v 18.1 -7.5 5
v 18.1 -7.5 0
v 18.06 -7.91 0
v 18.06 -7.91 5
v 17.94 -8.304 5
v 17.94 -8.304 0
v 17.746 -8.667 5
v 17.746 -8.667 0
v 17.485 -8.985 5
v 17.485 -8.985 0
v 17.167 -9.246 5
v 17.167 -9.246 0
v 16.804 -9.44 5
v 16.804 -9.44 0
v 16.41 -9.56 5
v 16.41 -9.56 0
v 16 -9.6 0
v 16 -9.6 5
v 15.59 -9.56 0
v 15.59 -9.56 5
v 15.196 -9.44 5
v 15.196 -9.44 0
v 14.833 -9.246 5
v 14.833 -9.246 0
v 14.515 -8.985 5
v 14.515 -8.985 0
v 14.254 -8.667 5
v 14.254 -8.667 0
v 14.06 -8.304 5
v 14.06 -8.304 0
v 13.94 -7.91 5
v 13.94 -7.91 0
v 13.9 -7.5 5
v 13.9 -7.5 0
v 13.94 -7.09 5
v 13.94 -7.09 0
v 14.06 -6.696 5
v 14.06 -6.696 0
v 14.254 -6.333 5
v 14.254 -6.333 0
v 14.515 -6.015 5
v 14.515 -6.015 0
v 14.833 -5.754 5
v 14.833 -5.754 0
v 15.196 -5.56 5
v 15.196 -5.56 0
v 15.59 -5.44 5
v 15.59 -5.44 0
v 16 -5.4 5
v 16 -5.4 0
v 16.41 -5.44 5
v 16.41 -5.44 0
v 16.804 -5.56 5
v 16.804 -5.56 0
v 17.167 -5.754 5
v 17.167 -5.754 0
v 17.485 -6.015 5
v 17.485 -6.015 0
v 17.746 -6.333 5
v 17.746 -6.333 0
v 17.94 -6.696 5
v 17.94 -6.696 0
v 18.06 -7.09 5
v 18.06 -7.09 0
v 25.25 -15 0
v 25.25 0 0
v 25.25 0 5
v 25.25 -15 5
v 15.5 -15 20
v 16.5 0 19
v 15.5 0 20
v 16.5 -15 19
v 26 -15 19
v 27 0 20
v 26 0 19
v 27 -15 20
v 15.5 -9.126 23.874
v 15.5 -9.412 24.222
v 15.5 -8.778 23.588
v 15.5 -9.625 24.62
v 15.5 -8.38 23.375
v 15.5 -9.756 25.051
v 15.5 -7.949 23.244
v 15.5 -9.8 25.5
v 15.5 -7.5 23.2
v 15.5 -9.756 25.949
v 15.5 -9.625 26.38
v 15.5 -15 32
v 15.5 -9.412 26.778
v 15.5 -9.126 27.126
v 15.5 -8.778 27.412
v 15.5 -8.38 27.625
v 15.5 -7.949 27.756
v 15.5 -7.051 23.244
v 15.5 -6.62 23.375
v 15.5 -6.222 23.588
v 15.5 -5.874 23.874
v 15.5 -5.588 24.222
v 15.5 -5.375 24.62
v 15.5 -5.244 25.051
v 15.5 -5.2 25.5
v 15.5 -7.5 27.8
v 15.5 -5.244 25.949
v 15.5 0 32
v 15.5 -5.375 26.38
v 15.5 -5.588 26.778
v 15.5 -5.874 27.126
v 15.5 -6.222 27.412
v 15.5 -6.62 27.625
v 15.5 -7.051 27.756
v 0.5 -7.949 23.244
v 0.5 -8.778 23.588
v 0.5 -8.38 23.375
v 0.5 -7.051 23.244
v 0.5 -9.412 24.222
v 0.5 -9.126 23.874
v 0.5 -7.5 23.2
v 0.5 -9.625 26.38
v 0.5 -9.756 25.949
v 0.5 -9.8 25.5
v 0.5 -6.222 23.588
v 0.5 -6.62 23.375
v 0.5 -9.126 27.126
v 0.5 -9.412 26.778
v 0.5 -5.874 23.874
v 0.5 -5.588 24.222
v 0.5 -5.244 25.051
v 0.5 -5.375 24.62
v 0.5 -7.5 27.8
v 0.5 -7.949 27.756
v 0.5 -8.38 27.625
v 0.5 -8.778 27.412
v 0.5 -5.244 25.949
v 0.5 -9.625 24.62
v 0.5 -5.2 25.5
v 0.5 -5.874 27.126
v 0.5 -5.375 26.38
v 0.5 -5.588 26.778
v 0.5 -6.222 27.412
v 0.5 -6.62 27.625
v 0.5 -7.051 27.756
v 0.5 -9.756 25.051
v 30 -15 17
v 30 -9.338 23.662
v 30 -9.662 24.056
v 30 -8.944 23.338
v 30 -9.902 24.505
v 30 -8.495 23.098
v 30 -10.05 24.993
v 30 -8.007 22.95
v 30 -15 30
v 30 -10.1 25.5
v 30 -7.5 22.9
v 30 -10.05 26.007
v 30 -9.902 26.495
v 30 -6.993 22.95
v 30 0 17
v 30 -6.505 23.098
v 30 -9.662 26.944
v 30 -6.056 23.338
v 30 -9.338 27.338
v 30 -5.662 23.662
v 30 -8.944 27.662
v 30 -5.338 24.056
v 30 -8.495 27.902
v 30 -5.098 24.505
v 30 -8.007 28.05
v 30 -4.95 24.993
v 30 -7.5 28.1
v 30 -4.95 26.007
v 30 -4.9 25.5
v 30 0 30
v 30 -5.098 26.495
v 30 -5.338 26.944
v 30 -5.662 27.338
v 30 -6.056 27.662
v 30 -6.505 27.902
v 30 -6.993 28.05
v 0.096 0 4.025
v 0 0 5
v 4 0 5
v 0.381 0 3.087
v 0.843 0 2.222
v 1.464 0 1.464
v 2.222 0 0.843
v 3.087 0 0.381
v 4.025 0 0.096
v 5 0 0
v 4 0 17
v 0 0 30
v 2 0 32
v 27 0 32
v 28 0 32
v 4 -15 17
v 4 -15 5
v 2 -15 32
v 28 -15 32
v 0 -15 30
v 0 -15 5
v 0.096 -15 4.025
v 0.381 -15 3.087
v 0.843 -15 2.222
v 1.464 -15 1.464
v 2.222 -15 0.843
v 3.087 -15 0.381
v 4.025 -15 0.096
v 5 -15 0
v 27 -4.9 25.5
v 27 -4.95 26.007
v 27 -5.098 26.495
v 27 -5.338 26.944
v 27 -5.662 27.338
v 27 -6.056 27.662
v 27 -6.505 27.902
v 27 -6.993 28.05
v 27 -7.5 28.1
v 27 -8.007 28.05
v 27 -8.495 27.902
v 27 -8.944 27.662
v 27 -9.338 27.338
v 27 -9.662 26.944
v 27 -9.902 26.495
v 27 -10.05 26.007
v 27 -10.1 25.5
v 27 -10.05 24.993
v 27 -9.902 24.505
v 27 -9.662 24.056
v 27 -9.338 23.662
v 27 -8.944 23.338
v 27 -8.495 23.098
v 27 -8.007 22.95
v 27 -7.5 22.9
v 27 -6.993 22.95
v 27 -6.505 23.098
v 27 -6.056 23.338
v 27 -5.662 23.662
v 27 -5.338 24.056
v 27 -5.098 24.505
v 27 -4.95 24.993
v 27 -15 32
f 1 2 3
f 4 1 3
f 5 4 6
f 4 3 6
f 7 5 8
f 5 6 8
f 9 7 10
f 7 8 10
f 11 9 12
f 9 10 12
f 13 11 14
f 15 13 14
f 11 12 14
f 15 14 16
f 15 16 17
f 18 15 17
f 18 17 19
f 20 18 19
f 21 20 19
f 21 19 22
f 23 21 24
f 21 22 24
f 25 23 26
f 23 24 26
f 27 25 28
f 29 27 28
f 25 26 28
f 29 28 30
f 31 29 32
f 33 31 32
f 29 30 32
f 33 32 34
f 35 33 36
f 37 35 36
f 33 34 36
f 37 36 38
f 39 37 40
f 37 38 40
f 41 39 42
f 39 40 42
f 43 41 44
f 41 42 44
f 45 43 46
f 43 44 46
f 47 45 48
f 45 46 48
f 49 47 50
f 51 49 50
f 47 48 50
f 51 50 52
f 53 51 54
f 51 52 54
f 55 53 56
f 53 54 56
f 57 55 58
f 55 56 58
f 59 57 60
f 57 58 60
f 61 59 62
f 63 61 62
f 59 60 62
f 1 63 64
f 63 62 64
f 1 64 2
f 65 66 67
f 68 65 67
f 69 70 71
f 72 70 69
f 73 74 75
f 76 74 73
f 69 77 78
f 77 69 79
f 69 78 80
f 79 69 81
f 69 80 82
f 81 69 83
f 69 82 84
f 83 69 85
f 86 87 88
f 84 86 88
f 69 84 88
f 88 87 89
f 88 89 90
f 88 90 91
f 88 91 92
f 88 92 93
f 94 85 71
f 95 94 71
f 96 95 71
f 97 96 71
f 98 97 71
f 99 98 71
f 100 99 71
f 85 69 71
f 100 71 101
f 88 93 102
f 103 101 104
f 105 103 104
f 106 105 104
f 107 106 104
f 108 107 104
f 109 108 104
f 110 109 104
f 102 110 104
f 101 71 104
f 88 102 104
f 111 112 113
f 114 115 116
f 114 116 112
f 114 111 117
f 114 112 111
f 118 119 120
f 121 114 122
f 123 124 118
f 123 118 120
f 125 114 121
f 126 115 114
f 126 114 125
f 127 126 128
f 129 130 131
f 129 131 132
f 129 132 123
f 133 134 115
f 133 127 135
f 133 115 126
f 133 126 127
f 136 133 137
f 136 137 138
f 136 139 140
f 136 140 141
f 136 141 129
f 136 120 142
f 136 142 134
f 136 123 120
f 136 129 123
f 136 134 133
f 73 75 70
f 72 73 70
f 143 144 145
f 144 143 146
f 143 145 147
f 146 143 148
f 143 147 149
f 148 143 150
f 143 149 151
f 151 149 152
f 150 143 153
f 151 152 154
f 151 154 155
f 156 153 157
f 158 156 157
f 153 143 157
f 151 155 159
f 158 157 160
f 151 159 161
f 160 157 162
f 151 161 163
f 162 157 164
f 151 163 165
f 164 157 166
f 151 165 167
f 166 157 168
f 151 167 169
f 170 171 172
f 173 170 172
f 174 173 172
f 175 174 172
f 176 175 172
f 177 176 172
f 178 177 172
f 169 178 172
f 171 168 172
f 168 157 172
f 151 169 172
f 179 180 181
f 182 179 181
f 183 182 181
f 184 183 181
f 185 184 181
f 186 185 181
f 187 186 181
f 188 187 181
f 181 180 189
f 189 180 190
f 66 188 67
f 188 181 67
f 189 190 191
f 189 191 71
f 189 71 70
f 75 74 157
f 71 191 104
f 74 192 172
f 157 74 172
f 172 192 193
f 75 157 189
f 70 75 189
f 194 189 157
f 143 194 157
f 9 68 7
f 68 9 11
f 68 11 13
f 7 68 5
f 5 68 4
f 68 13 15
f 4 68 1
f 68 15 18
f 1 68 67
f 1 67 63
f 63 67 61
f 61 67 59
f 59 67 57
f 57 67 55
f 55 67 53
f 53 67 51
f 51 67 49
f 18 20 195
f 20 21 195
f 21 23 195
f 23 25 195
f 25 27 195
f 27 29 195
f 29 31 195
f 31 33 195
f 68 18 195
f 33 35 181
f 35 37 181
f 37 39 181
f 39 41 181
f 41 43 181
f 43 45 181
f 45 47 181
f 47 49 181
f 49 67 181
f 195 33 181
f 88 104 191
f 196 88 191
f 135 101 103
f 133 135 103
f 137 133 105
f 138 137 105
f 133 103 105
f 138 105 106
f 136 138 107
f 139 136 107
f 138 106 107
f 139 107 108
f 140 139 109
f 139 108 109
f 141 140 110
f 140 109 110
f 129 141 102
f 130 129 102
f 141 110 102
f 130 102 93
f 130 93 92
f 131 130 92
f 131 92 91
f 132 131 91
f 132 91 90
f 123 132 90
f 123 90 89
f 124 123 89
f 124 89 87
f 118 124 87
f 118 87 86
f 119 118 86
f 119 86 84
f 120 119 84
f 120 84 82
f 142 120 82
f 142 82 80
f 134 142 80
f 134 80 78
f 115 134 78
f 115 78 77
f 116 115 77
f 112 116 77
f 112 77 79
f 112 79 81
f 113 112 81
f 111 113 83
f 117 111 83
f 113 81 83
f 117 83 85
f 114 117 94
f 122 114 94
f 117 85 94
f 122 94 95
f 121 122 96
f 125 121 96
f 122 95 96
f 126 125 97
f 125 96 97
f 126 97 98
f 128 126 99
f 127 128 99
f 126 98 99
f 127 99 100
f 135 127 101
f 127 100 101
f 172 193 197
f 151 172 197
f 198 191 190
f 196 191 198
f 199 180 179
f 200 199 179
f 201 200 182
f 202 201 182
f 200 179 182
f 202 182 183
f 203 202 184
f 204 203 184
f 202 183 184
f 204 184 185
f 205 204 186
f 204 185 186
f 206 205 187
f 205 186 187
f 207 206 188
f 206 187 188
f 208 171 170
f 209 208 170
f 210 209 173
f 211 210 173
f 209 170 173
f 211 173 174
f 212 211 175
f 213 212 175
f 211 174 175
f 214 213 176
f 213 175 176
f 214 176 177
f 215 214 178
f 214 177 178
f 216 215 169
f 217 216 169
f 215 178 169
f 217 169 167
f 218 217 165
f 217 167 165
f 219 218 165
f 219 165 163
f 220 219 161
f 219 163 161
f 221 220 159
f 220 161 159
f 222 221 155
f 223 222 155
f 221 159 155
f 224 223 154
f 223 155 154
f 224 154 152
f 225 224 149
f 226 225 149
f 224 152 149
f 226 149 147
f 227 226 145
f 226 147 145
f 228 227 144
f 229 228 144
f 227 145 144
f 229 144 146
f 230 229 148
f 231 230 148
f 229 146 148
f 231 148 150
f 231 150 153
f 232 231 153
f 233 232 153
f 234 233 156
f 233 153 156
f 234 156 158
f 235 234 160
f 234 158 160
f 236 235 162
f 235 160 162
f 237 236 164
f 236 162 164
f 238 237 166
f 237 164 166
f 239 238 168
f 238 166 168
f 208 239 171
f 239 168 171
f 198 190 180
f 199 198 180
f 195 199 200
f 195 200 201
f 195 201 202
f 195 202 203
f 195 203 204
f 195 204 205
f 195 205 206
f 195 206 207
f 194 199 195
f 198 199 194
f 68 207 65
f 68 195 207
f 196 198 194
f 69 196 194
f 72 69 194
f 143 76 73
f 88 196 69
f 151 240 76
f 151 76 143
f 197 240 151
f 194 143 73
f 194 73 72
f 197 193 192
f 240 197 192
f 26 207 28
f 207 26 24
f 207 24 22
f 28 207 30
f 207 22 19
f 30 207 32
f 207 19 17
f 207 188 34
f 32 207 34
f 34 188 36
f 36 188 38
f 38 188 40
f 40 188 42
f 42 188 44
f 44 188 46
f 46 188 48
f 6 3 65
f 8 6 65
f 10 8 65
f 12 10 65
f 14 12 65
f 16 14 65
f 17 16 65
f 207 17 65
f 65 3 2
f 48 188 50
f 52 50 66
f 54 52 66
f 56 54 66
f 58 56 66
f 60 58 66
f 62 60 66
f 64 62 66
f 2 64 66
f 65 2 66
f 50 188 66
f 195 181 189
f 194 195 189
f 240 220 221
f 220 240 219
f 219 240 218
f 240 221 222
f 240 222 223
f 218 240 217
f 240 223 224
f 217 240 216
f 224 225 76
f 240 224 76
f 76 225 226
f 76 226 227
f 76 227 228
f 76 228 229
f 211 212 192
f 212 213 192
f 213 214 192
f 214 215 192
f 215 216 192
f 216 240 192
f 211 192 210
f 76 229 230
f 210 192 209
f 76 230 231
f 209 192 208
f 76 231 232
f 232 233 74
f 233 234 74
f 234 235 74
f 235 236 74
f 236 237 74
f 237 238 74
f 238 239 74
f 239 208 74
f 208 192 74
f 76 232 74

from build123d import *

# Parameters (mm, degrees)
F1_DEPTH = 15
F2_SIZE  = 2
F3_SIZE  = 1
F4_R     = 2.1
F5_DEPTH = 5
F6_R     = 2.3
F7_DEPTH = 29.5
F8_R     = 2.6
F8_R_2   = 2.3
F9_DEPTH = 3


with BuildPart() as f1:
    # F0 (on Front) → F1 (new body)
    with BuildSketch(Plane.XZ):
        with BuildLine():
            Line((0, 32), (0, 5))
            ThreePointArc((0, 5), (1.4644660941, 1.4644660941), (5, 0))
            Line((5, 0), (25.25, 0))
            Line((25.25, 0), (25.25, 5))
            Line((25.25, 5), (4, 5))
            Line((4, 5), (4, 17))
            Line((4, 17), (30, 17))
            Line((30, 17), (30, 32))
            Line((30, 32), (27, 32))
            Line((27, 32), (27, 19))
            Line((27, 19), (15.5, 19))
            Line((15.5, 19), (15.5, 32))
            Line((15.5, 32), (0, 32))
        make_face()
    extrude(amount=F1_DEPTH)

    # F2
    f2_edges = [f1.edges().sort_by_distance(p)[0] for p in [
        (0, -7.5, 32),
        (30, -7.5, 32),
    ]]
    chamfer(f2_edges, length=F2_SIZE)

    # F3
    f3_edges = [f1.edges().sort_by_distance(p)[0] for p in [
        (15.5, -7.5, 19),
        (27, -7.5, 19),
    ]]
    chamfer(f3_edges, length=F3_SIZE)

    # F4 (on face) → F5 (cut, through all)
    with BuildSketch(Plane(origin=(0, 0, 0), x_dir=(1, 0, 0), z_dir=(0, 0, -1))):
        with Locations((16, 7.5)):
            Circle(F4_R)
    extrude(amount=-F5_DEPTH, mode=Mode.SUBTRACT)

    # F6 (on face) → F7 (cut)
    with BuildSketch(Plane.YZ.offset(30)):
        with Locations((-7.5, 25.5)):
            Circle(F6_R)
    extrude(amount=-F7_DEPTH, mode=Mode.SUBTRACT)

    # F8 (on face) → F9 (cut, through all)
    with BuildSketch(Plane.YZ.offset(30)):
        with Locations((-7.5, 25.5)):
            Circle(F8_R)
        with Locations((-7.5, 25.5)):
            Circle(F8_R_2, mode=Mode.SUBTRACT)
    extrude(amount=-F9_DEPTH, mode=Mode.SUBTRACT)


solid = f1.part
